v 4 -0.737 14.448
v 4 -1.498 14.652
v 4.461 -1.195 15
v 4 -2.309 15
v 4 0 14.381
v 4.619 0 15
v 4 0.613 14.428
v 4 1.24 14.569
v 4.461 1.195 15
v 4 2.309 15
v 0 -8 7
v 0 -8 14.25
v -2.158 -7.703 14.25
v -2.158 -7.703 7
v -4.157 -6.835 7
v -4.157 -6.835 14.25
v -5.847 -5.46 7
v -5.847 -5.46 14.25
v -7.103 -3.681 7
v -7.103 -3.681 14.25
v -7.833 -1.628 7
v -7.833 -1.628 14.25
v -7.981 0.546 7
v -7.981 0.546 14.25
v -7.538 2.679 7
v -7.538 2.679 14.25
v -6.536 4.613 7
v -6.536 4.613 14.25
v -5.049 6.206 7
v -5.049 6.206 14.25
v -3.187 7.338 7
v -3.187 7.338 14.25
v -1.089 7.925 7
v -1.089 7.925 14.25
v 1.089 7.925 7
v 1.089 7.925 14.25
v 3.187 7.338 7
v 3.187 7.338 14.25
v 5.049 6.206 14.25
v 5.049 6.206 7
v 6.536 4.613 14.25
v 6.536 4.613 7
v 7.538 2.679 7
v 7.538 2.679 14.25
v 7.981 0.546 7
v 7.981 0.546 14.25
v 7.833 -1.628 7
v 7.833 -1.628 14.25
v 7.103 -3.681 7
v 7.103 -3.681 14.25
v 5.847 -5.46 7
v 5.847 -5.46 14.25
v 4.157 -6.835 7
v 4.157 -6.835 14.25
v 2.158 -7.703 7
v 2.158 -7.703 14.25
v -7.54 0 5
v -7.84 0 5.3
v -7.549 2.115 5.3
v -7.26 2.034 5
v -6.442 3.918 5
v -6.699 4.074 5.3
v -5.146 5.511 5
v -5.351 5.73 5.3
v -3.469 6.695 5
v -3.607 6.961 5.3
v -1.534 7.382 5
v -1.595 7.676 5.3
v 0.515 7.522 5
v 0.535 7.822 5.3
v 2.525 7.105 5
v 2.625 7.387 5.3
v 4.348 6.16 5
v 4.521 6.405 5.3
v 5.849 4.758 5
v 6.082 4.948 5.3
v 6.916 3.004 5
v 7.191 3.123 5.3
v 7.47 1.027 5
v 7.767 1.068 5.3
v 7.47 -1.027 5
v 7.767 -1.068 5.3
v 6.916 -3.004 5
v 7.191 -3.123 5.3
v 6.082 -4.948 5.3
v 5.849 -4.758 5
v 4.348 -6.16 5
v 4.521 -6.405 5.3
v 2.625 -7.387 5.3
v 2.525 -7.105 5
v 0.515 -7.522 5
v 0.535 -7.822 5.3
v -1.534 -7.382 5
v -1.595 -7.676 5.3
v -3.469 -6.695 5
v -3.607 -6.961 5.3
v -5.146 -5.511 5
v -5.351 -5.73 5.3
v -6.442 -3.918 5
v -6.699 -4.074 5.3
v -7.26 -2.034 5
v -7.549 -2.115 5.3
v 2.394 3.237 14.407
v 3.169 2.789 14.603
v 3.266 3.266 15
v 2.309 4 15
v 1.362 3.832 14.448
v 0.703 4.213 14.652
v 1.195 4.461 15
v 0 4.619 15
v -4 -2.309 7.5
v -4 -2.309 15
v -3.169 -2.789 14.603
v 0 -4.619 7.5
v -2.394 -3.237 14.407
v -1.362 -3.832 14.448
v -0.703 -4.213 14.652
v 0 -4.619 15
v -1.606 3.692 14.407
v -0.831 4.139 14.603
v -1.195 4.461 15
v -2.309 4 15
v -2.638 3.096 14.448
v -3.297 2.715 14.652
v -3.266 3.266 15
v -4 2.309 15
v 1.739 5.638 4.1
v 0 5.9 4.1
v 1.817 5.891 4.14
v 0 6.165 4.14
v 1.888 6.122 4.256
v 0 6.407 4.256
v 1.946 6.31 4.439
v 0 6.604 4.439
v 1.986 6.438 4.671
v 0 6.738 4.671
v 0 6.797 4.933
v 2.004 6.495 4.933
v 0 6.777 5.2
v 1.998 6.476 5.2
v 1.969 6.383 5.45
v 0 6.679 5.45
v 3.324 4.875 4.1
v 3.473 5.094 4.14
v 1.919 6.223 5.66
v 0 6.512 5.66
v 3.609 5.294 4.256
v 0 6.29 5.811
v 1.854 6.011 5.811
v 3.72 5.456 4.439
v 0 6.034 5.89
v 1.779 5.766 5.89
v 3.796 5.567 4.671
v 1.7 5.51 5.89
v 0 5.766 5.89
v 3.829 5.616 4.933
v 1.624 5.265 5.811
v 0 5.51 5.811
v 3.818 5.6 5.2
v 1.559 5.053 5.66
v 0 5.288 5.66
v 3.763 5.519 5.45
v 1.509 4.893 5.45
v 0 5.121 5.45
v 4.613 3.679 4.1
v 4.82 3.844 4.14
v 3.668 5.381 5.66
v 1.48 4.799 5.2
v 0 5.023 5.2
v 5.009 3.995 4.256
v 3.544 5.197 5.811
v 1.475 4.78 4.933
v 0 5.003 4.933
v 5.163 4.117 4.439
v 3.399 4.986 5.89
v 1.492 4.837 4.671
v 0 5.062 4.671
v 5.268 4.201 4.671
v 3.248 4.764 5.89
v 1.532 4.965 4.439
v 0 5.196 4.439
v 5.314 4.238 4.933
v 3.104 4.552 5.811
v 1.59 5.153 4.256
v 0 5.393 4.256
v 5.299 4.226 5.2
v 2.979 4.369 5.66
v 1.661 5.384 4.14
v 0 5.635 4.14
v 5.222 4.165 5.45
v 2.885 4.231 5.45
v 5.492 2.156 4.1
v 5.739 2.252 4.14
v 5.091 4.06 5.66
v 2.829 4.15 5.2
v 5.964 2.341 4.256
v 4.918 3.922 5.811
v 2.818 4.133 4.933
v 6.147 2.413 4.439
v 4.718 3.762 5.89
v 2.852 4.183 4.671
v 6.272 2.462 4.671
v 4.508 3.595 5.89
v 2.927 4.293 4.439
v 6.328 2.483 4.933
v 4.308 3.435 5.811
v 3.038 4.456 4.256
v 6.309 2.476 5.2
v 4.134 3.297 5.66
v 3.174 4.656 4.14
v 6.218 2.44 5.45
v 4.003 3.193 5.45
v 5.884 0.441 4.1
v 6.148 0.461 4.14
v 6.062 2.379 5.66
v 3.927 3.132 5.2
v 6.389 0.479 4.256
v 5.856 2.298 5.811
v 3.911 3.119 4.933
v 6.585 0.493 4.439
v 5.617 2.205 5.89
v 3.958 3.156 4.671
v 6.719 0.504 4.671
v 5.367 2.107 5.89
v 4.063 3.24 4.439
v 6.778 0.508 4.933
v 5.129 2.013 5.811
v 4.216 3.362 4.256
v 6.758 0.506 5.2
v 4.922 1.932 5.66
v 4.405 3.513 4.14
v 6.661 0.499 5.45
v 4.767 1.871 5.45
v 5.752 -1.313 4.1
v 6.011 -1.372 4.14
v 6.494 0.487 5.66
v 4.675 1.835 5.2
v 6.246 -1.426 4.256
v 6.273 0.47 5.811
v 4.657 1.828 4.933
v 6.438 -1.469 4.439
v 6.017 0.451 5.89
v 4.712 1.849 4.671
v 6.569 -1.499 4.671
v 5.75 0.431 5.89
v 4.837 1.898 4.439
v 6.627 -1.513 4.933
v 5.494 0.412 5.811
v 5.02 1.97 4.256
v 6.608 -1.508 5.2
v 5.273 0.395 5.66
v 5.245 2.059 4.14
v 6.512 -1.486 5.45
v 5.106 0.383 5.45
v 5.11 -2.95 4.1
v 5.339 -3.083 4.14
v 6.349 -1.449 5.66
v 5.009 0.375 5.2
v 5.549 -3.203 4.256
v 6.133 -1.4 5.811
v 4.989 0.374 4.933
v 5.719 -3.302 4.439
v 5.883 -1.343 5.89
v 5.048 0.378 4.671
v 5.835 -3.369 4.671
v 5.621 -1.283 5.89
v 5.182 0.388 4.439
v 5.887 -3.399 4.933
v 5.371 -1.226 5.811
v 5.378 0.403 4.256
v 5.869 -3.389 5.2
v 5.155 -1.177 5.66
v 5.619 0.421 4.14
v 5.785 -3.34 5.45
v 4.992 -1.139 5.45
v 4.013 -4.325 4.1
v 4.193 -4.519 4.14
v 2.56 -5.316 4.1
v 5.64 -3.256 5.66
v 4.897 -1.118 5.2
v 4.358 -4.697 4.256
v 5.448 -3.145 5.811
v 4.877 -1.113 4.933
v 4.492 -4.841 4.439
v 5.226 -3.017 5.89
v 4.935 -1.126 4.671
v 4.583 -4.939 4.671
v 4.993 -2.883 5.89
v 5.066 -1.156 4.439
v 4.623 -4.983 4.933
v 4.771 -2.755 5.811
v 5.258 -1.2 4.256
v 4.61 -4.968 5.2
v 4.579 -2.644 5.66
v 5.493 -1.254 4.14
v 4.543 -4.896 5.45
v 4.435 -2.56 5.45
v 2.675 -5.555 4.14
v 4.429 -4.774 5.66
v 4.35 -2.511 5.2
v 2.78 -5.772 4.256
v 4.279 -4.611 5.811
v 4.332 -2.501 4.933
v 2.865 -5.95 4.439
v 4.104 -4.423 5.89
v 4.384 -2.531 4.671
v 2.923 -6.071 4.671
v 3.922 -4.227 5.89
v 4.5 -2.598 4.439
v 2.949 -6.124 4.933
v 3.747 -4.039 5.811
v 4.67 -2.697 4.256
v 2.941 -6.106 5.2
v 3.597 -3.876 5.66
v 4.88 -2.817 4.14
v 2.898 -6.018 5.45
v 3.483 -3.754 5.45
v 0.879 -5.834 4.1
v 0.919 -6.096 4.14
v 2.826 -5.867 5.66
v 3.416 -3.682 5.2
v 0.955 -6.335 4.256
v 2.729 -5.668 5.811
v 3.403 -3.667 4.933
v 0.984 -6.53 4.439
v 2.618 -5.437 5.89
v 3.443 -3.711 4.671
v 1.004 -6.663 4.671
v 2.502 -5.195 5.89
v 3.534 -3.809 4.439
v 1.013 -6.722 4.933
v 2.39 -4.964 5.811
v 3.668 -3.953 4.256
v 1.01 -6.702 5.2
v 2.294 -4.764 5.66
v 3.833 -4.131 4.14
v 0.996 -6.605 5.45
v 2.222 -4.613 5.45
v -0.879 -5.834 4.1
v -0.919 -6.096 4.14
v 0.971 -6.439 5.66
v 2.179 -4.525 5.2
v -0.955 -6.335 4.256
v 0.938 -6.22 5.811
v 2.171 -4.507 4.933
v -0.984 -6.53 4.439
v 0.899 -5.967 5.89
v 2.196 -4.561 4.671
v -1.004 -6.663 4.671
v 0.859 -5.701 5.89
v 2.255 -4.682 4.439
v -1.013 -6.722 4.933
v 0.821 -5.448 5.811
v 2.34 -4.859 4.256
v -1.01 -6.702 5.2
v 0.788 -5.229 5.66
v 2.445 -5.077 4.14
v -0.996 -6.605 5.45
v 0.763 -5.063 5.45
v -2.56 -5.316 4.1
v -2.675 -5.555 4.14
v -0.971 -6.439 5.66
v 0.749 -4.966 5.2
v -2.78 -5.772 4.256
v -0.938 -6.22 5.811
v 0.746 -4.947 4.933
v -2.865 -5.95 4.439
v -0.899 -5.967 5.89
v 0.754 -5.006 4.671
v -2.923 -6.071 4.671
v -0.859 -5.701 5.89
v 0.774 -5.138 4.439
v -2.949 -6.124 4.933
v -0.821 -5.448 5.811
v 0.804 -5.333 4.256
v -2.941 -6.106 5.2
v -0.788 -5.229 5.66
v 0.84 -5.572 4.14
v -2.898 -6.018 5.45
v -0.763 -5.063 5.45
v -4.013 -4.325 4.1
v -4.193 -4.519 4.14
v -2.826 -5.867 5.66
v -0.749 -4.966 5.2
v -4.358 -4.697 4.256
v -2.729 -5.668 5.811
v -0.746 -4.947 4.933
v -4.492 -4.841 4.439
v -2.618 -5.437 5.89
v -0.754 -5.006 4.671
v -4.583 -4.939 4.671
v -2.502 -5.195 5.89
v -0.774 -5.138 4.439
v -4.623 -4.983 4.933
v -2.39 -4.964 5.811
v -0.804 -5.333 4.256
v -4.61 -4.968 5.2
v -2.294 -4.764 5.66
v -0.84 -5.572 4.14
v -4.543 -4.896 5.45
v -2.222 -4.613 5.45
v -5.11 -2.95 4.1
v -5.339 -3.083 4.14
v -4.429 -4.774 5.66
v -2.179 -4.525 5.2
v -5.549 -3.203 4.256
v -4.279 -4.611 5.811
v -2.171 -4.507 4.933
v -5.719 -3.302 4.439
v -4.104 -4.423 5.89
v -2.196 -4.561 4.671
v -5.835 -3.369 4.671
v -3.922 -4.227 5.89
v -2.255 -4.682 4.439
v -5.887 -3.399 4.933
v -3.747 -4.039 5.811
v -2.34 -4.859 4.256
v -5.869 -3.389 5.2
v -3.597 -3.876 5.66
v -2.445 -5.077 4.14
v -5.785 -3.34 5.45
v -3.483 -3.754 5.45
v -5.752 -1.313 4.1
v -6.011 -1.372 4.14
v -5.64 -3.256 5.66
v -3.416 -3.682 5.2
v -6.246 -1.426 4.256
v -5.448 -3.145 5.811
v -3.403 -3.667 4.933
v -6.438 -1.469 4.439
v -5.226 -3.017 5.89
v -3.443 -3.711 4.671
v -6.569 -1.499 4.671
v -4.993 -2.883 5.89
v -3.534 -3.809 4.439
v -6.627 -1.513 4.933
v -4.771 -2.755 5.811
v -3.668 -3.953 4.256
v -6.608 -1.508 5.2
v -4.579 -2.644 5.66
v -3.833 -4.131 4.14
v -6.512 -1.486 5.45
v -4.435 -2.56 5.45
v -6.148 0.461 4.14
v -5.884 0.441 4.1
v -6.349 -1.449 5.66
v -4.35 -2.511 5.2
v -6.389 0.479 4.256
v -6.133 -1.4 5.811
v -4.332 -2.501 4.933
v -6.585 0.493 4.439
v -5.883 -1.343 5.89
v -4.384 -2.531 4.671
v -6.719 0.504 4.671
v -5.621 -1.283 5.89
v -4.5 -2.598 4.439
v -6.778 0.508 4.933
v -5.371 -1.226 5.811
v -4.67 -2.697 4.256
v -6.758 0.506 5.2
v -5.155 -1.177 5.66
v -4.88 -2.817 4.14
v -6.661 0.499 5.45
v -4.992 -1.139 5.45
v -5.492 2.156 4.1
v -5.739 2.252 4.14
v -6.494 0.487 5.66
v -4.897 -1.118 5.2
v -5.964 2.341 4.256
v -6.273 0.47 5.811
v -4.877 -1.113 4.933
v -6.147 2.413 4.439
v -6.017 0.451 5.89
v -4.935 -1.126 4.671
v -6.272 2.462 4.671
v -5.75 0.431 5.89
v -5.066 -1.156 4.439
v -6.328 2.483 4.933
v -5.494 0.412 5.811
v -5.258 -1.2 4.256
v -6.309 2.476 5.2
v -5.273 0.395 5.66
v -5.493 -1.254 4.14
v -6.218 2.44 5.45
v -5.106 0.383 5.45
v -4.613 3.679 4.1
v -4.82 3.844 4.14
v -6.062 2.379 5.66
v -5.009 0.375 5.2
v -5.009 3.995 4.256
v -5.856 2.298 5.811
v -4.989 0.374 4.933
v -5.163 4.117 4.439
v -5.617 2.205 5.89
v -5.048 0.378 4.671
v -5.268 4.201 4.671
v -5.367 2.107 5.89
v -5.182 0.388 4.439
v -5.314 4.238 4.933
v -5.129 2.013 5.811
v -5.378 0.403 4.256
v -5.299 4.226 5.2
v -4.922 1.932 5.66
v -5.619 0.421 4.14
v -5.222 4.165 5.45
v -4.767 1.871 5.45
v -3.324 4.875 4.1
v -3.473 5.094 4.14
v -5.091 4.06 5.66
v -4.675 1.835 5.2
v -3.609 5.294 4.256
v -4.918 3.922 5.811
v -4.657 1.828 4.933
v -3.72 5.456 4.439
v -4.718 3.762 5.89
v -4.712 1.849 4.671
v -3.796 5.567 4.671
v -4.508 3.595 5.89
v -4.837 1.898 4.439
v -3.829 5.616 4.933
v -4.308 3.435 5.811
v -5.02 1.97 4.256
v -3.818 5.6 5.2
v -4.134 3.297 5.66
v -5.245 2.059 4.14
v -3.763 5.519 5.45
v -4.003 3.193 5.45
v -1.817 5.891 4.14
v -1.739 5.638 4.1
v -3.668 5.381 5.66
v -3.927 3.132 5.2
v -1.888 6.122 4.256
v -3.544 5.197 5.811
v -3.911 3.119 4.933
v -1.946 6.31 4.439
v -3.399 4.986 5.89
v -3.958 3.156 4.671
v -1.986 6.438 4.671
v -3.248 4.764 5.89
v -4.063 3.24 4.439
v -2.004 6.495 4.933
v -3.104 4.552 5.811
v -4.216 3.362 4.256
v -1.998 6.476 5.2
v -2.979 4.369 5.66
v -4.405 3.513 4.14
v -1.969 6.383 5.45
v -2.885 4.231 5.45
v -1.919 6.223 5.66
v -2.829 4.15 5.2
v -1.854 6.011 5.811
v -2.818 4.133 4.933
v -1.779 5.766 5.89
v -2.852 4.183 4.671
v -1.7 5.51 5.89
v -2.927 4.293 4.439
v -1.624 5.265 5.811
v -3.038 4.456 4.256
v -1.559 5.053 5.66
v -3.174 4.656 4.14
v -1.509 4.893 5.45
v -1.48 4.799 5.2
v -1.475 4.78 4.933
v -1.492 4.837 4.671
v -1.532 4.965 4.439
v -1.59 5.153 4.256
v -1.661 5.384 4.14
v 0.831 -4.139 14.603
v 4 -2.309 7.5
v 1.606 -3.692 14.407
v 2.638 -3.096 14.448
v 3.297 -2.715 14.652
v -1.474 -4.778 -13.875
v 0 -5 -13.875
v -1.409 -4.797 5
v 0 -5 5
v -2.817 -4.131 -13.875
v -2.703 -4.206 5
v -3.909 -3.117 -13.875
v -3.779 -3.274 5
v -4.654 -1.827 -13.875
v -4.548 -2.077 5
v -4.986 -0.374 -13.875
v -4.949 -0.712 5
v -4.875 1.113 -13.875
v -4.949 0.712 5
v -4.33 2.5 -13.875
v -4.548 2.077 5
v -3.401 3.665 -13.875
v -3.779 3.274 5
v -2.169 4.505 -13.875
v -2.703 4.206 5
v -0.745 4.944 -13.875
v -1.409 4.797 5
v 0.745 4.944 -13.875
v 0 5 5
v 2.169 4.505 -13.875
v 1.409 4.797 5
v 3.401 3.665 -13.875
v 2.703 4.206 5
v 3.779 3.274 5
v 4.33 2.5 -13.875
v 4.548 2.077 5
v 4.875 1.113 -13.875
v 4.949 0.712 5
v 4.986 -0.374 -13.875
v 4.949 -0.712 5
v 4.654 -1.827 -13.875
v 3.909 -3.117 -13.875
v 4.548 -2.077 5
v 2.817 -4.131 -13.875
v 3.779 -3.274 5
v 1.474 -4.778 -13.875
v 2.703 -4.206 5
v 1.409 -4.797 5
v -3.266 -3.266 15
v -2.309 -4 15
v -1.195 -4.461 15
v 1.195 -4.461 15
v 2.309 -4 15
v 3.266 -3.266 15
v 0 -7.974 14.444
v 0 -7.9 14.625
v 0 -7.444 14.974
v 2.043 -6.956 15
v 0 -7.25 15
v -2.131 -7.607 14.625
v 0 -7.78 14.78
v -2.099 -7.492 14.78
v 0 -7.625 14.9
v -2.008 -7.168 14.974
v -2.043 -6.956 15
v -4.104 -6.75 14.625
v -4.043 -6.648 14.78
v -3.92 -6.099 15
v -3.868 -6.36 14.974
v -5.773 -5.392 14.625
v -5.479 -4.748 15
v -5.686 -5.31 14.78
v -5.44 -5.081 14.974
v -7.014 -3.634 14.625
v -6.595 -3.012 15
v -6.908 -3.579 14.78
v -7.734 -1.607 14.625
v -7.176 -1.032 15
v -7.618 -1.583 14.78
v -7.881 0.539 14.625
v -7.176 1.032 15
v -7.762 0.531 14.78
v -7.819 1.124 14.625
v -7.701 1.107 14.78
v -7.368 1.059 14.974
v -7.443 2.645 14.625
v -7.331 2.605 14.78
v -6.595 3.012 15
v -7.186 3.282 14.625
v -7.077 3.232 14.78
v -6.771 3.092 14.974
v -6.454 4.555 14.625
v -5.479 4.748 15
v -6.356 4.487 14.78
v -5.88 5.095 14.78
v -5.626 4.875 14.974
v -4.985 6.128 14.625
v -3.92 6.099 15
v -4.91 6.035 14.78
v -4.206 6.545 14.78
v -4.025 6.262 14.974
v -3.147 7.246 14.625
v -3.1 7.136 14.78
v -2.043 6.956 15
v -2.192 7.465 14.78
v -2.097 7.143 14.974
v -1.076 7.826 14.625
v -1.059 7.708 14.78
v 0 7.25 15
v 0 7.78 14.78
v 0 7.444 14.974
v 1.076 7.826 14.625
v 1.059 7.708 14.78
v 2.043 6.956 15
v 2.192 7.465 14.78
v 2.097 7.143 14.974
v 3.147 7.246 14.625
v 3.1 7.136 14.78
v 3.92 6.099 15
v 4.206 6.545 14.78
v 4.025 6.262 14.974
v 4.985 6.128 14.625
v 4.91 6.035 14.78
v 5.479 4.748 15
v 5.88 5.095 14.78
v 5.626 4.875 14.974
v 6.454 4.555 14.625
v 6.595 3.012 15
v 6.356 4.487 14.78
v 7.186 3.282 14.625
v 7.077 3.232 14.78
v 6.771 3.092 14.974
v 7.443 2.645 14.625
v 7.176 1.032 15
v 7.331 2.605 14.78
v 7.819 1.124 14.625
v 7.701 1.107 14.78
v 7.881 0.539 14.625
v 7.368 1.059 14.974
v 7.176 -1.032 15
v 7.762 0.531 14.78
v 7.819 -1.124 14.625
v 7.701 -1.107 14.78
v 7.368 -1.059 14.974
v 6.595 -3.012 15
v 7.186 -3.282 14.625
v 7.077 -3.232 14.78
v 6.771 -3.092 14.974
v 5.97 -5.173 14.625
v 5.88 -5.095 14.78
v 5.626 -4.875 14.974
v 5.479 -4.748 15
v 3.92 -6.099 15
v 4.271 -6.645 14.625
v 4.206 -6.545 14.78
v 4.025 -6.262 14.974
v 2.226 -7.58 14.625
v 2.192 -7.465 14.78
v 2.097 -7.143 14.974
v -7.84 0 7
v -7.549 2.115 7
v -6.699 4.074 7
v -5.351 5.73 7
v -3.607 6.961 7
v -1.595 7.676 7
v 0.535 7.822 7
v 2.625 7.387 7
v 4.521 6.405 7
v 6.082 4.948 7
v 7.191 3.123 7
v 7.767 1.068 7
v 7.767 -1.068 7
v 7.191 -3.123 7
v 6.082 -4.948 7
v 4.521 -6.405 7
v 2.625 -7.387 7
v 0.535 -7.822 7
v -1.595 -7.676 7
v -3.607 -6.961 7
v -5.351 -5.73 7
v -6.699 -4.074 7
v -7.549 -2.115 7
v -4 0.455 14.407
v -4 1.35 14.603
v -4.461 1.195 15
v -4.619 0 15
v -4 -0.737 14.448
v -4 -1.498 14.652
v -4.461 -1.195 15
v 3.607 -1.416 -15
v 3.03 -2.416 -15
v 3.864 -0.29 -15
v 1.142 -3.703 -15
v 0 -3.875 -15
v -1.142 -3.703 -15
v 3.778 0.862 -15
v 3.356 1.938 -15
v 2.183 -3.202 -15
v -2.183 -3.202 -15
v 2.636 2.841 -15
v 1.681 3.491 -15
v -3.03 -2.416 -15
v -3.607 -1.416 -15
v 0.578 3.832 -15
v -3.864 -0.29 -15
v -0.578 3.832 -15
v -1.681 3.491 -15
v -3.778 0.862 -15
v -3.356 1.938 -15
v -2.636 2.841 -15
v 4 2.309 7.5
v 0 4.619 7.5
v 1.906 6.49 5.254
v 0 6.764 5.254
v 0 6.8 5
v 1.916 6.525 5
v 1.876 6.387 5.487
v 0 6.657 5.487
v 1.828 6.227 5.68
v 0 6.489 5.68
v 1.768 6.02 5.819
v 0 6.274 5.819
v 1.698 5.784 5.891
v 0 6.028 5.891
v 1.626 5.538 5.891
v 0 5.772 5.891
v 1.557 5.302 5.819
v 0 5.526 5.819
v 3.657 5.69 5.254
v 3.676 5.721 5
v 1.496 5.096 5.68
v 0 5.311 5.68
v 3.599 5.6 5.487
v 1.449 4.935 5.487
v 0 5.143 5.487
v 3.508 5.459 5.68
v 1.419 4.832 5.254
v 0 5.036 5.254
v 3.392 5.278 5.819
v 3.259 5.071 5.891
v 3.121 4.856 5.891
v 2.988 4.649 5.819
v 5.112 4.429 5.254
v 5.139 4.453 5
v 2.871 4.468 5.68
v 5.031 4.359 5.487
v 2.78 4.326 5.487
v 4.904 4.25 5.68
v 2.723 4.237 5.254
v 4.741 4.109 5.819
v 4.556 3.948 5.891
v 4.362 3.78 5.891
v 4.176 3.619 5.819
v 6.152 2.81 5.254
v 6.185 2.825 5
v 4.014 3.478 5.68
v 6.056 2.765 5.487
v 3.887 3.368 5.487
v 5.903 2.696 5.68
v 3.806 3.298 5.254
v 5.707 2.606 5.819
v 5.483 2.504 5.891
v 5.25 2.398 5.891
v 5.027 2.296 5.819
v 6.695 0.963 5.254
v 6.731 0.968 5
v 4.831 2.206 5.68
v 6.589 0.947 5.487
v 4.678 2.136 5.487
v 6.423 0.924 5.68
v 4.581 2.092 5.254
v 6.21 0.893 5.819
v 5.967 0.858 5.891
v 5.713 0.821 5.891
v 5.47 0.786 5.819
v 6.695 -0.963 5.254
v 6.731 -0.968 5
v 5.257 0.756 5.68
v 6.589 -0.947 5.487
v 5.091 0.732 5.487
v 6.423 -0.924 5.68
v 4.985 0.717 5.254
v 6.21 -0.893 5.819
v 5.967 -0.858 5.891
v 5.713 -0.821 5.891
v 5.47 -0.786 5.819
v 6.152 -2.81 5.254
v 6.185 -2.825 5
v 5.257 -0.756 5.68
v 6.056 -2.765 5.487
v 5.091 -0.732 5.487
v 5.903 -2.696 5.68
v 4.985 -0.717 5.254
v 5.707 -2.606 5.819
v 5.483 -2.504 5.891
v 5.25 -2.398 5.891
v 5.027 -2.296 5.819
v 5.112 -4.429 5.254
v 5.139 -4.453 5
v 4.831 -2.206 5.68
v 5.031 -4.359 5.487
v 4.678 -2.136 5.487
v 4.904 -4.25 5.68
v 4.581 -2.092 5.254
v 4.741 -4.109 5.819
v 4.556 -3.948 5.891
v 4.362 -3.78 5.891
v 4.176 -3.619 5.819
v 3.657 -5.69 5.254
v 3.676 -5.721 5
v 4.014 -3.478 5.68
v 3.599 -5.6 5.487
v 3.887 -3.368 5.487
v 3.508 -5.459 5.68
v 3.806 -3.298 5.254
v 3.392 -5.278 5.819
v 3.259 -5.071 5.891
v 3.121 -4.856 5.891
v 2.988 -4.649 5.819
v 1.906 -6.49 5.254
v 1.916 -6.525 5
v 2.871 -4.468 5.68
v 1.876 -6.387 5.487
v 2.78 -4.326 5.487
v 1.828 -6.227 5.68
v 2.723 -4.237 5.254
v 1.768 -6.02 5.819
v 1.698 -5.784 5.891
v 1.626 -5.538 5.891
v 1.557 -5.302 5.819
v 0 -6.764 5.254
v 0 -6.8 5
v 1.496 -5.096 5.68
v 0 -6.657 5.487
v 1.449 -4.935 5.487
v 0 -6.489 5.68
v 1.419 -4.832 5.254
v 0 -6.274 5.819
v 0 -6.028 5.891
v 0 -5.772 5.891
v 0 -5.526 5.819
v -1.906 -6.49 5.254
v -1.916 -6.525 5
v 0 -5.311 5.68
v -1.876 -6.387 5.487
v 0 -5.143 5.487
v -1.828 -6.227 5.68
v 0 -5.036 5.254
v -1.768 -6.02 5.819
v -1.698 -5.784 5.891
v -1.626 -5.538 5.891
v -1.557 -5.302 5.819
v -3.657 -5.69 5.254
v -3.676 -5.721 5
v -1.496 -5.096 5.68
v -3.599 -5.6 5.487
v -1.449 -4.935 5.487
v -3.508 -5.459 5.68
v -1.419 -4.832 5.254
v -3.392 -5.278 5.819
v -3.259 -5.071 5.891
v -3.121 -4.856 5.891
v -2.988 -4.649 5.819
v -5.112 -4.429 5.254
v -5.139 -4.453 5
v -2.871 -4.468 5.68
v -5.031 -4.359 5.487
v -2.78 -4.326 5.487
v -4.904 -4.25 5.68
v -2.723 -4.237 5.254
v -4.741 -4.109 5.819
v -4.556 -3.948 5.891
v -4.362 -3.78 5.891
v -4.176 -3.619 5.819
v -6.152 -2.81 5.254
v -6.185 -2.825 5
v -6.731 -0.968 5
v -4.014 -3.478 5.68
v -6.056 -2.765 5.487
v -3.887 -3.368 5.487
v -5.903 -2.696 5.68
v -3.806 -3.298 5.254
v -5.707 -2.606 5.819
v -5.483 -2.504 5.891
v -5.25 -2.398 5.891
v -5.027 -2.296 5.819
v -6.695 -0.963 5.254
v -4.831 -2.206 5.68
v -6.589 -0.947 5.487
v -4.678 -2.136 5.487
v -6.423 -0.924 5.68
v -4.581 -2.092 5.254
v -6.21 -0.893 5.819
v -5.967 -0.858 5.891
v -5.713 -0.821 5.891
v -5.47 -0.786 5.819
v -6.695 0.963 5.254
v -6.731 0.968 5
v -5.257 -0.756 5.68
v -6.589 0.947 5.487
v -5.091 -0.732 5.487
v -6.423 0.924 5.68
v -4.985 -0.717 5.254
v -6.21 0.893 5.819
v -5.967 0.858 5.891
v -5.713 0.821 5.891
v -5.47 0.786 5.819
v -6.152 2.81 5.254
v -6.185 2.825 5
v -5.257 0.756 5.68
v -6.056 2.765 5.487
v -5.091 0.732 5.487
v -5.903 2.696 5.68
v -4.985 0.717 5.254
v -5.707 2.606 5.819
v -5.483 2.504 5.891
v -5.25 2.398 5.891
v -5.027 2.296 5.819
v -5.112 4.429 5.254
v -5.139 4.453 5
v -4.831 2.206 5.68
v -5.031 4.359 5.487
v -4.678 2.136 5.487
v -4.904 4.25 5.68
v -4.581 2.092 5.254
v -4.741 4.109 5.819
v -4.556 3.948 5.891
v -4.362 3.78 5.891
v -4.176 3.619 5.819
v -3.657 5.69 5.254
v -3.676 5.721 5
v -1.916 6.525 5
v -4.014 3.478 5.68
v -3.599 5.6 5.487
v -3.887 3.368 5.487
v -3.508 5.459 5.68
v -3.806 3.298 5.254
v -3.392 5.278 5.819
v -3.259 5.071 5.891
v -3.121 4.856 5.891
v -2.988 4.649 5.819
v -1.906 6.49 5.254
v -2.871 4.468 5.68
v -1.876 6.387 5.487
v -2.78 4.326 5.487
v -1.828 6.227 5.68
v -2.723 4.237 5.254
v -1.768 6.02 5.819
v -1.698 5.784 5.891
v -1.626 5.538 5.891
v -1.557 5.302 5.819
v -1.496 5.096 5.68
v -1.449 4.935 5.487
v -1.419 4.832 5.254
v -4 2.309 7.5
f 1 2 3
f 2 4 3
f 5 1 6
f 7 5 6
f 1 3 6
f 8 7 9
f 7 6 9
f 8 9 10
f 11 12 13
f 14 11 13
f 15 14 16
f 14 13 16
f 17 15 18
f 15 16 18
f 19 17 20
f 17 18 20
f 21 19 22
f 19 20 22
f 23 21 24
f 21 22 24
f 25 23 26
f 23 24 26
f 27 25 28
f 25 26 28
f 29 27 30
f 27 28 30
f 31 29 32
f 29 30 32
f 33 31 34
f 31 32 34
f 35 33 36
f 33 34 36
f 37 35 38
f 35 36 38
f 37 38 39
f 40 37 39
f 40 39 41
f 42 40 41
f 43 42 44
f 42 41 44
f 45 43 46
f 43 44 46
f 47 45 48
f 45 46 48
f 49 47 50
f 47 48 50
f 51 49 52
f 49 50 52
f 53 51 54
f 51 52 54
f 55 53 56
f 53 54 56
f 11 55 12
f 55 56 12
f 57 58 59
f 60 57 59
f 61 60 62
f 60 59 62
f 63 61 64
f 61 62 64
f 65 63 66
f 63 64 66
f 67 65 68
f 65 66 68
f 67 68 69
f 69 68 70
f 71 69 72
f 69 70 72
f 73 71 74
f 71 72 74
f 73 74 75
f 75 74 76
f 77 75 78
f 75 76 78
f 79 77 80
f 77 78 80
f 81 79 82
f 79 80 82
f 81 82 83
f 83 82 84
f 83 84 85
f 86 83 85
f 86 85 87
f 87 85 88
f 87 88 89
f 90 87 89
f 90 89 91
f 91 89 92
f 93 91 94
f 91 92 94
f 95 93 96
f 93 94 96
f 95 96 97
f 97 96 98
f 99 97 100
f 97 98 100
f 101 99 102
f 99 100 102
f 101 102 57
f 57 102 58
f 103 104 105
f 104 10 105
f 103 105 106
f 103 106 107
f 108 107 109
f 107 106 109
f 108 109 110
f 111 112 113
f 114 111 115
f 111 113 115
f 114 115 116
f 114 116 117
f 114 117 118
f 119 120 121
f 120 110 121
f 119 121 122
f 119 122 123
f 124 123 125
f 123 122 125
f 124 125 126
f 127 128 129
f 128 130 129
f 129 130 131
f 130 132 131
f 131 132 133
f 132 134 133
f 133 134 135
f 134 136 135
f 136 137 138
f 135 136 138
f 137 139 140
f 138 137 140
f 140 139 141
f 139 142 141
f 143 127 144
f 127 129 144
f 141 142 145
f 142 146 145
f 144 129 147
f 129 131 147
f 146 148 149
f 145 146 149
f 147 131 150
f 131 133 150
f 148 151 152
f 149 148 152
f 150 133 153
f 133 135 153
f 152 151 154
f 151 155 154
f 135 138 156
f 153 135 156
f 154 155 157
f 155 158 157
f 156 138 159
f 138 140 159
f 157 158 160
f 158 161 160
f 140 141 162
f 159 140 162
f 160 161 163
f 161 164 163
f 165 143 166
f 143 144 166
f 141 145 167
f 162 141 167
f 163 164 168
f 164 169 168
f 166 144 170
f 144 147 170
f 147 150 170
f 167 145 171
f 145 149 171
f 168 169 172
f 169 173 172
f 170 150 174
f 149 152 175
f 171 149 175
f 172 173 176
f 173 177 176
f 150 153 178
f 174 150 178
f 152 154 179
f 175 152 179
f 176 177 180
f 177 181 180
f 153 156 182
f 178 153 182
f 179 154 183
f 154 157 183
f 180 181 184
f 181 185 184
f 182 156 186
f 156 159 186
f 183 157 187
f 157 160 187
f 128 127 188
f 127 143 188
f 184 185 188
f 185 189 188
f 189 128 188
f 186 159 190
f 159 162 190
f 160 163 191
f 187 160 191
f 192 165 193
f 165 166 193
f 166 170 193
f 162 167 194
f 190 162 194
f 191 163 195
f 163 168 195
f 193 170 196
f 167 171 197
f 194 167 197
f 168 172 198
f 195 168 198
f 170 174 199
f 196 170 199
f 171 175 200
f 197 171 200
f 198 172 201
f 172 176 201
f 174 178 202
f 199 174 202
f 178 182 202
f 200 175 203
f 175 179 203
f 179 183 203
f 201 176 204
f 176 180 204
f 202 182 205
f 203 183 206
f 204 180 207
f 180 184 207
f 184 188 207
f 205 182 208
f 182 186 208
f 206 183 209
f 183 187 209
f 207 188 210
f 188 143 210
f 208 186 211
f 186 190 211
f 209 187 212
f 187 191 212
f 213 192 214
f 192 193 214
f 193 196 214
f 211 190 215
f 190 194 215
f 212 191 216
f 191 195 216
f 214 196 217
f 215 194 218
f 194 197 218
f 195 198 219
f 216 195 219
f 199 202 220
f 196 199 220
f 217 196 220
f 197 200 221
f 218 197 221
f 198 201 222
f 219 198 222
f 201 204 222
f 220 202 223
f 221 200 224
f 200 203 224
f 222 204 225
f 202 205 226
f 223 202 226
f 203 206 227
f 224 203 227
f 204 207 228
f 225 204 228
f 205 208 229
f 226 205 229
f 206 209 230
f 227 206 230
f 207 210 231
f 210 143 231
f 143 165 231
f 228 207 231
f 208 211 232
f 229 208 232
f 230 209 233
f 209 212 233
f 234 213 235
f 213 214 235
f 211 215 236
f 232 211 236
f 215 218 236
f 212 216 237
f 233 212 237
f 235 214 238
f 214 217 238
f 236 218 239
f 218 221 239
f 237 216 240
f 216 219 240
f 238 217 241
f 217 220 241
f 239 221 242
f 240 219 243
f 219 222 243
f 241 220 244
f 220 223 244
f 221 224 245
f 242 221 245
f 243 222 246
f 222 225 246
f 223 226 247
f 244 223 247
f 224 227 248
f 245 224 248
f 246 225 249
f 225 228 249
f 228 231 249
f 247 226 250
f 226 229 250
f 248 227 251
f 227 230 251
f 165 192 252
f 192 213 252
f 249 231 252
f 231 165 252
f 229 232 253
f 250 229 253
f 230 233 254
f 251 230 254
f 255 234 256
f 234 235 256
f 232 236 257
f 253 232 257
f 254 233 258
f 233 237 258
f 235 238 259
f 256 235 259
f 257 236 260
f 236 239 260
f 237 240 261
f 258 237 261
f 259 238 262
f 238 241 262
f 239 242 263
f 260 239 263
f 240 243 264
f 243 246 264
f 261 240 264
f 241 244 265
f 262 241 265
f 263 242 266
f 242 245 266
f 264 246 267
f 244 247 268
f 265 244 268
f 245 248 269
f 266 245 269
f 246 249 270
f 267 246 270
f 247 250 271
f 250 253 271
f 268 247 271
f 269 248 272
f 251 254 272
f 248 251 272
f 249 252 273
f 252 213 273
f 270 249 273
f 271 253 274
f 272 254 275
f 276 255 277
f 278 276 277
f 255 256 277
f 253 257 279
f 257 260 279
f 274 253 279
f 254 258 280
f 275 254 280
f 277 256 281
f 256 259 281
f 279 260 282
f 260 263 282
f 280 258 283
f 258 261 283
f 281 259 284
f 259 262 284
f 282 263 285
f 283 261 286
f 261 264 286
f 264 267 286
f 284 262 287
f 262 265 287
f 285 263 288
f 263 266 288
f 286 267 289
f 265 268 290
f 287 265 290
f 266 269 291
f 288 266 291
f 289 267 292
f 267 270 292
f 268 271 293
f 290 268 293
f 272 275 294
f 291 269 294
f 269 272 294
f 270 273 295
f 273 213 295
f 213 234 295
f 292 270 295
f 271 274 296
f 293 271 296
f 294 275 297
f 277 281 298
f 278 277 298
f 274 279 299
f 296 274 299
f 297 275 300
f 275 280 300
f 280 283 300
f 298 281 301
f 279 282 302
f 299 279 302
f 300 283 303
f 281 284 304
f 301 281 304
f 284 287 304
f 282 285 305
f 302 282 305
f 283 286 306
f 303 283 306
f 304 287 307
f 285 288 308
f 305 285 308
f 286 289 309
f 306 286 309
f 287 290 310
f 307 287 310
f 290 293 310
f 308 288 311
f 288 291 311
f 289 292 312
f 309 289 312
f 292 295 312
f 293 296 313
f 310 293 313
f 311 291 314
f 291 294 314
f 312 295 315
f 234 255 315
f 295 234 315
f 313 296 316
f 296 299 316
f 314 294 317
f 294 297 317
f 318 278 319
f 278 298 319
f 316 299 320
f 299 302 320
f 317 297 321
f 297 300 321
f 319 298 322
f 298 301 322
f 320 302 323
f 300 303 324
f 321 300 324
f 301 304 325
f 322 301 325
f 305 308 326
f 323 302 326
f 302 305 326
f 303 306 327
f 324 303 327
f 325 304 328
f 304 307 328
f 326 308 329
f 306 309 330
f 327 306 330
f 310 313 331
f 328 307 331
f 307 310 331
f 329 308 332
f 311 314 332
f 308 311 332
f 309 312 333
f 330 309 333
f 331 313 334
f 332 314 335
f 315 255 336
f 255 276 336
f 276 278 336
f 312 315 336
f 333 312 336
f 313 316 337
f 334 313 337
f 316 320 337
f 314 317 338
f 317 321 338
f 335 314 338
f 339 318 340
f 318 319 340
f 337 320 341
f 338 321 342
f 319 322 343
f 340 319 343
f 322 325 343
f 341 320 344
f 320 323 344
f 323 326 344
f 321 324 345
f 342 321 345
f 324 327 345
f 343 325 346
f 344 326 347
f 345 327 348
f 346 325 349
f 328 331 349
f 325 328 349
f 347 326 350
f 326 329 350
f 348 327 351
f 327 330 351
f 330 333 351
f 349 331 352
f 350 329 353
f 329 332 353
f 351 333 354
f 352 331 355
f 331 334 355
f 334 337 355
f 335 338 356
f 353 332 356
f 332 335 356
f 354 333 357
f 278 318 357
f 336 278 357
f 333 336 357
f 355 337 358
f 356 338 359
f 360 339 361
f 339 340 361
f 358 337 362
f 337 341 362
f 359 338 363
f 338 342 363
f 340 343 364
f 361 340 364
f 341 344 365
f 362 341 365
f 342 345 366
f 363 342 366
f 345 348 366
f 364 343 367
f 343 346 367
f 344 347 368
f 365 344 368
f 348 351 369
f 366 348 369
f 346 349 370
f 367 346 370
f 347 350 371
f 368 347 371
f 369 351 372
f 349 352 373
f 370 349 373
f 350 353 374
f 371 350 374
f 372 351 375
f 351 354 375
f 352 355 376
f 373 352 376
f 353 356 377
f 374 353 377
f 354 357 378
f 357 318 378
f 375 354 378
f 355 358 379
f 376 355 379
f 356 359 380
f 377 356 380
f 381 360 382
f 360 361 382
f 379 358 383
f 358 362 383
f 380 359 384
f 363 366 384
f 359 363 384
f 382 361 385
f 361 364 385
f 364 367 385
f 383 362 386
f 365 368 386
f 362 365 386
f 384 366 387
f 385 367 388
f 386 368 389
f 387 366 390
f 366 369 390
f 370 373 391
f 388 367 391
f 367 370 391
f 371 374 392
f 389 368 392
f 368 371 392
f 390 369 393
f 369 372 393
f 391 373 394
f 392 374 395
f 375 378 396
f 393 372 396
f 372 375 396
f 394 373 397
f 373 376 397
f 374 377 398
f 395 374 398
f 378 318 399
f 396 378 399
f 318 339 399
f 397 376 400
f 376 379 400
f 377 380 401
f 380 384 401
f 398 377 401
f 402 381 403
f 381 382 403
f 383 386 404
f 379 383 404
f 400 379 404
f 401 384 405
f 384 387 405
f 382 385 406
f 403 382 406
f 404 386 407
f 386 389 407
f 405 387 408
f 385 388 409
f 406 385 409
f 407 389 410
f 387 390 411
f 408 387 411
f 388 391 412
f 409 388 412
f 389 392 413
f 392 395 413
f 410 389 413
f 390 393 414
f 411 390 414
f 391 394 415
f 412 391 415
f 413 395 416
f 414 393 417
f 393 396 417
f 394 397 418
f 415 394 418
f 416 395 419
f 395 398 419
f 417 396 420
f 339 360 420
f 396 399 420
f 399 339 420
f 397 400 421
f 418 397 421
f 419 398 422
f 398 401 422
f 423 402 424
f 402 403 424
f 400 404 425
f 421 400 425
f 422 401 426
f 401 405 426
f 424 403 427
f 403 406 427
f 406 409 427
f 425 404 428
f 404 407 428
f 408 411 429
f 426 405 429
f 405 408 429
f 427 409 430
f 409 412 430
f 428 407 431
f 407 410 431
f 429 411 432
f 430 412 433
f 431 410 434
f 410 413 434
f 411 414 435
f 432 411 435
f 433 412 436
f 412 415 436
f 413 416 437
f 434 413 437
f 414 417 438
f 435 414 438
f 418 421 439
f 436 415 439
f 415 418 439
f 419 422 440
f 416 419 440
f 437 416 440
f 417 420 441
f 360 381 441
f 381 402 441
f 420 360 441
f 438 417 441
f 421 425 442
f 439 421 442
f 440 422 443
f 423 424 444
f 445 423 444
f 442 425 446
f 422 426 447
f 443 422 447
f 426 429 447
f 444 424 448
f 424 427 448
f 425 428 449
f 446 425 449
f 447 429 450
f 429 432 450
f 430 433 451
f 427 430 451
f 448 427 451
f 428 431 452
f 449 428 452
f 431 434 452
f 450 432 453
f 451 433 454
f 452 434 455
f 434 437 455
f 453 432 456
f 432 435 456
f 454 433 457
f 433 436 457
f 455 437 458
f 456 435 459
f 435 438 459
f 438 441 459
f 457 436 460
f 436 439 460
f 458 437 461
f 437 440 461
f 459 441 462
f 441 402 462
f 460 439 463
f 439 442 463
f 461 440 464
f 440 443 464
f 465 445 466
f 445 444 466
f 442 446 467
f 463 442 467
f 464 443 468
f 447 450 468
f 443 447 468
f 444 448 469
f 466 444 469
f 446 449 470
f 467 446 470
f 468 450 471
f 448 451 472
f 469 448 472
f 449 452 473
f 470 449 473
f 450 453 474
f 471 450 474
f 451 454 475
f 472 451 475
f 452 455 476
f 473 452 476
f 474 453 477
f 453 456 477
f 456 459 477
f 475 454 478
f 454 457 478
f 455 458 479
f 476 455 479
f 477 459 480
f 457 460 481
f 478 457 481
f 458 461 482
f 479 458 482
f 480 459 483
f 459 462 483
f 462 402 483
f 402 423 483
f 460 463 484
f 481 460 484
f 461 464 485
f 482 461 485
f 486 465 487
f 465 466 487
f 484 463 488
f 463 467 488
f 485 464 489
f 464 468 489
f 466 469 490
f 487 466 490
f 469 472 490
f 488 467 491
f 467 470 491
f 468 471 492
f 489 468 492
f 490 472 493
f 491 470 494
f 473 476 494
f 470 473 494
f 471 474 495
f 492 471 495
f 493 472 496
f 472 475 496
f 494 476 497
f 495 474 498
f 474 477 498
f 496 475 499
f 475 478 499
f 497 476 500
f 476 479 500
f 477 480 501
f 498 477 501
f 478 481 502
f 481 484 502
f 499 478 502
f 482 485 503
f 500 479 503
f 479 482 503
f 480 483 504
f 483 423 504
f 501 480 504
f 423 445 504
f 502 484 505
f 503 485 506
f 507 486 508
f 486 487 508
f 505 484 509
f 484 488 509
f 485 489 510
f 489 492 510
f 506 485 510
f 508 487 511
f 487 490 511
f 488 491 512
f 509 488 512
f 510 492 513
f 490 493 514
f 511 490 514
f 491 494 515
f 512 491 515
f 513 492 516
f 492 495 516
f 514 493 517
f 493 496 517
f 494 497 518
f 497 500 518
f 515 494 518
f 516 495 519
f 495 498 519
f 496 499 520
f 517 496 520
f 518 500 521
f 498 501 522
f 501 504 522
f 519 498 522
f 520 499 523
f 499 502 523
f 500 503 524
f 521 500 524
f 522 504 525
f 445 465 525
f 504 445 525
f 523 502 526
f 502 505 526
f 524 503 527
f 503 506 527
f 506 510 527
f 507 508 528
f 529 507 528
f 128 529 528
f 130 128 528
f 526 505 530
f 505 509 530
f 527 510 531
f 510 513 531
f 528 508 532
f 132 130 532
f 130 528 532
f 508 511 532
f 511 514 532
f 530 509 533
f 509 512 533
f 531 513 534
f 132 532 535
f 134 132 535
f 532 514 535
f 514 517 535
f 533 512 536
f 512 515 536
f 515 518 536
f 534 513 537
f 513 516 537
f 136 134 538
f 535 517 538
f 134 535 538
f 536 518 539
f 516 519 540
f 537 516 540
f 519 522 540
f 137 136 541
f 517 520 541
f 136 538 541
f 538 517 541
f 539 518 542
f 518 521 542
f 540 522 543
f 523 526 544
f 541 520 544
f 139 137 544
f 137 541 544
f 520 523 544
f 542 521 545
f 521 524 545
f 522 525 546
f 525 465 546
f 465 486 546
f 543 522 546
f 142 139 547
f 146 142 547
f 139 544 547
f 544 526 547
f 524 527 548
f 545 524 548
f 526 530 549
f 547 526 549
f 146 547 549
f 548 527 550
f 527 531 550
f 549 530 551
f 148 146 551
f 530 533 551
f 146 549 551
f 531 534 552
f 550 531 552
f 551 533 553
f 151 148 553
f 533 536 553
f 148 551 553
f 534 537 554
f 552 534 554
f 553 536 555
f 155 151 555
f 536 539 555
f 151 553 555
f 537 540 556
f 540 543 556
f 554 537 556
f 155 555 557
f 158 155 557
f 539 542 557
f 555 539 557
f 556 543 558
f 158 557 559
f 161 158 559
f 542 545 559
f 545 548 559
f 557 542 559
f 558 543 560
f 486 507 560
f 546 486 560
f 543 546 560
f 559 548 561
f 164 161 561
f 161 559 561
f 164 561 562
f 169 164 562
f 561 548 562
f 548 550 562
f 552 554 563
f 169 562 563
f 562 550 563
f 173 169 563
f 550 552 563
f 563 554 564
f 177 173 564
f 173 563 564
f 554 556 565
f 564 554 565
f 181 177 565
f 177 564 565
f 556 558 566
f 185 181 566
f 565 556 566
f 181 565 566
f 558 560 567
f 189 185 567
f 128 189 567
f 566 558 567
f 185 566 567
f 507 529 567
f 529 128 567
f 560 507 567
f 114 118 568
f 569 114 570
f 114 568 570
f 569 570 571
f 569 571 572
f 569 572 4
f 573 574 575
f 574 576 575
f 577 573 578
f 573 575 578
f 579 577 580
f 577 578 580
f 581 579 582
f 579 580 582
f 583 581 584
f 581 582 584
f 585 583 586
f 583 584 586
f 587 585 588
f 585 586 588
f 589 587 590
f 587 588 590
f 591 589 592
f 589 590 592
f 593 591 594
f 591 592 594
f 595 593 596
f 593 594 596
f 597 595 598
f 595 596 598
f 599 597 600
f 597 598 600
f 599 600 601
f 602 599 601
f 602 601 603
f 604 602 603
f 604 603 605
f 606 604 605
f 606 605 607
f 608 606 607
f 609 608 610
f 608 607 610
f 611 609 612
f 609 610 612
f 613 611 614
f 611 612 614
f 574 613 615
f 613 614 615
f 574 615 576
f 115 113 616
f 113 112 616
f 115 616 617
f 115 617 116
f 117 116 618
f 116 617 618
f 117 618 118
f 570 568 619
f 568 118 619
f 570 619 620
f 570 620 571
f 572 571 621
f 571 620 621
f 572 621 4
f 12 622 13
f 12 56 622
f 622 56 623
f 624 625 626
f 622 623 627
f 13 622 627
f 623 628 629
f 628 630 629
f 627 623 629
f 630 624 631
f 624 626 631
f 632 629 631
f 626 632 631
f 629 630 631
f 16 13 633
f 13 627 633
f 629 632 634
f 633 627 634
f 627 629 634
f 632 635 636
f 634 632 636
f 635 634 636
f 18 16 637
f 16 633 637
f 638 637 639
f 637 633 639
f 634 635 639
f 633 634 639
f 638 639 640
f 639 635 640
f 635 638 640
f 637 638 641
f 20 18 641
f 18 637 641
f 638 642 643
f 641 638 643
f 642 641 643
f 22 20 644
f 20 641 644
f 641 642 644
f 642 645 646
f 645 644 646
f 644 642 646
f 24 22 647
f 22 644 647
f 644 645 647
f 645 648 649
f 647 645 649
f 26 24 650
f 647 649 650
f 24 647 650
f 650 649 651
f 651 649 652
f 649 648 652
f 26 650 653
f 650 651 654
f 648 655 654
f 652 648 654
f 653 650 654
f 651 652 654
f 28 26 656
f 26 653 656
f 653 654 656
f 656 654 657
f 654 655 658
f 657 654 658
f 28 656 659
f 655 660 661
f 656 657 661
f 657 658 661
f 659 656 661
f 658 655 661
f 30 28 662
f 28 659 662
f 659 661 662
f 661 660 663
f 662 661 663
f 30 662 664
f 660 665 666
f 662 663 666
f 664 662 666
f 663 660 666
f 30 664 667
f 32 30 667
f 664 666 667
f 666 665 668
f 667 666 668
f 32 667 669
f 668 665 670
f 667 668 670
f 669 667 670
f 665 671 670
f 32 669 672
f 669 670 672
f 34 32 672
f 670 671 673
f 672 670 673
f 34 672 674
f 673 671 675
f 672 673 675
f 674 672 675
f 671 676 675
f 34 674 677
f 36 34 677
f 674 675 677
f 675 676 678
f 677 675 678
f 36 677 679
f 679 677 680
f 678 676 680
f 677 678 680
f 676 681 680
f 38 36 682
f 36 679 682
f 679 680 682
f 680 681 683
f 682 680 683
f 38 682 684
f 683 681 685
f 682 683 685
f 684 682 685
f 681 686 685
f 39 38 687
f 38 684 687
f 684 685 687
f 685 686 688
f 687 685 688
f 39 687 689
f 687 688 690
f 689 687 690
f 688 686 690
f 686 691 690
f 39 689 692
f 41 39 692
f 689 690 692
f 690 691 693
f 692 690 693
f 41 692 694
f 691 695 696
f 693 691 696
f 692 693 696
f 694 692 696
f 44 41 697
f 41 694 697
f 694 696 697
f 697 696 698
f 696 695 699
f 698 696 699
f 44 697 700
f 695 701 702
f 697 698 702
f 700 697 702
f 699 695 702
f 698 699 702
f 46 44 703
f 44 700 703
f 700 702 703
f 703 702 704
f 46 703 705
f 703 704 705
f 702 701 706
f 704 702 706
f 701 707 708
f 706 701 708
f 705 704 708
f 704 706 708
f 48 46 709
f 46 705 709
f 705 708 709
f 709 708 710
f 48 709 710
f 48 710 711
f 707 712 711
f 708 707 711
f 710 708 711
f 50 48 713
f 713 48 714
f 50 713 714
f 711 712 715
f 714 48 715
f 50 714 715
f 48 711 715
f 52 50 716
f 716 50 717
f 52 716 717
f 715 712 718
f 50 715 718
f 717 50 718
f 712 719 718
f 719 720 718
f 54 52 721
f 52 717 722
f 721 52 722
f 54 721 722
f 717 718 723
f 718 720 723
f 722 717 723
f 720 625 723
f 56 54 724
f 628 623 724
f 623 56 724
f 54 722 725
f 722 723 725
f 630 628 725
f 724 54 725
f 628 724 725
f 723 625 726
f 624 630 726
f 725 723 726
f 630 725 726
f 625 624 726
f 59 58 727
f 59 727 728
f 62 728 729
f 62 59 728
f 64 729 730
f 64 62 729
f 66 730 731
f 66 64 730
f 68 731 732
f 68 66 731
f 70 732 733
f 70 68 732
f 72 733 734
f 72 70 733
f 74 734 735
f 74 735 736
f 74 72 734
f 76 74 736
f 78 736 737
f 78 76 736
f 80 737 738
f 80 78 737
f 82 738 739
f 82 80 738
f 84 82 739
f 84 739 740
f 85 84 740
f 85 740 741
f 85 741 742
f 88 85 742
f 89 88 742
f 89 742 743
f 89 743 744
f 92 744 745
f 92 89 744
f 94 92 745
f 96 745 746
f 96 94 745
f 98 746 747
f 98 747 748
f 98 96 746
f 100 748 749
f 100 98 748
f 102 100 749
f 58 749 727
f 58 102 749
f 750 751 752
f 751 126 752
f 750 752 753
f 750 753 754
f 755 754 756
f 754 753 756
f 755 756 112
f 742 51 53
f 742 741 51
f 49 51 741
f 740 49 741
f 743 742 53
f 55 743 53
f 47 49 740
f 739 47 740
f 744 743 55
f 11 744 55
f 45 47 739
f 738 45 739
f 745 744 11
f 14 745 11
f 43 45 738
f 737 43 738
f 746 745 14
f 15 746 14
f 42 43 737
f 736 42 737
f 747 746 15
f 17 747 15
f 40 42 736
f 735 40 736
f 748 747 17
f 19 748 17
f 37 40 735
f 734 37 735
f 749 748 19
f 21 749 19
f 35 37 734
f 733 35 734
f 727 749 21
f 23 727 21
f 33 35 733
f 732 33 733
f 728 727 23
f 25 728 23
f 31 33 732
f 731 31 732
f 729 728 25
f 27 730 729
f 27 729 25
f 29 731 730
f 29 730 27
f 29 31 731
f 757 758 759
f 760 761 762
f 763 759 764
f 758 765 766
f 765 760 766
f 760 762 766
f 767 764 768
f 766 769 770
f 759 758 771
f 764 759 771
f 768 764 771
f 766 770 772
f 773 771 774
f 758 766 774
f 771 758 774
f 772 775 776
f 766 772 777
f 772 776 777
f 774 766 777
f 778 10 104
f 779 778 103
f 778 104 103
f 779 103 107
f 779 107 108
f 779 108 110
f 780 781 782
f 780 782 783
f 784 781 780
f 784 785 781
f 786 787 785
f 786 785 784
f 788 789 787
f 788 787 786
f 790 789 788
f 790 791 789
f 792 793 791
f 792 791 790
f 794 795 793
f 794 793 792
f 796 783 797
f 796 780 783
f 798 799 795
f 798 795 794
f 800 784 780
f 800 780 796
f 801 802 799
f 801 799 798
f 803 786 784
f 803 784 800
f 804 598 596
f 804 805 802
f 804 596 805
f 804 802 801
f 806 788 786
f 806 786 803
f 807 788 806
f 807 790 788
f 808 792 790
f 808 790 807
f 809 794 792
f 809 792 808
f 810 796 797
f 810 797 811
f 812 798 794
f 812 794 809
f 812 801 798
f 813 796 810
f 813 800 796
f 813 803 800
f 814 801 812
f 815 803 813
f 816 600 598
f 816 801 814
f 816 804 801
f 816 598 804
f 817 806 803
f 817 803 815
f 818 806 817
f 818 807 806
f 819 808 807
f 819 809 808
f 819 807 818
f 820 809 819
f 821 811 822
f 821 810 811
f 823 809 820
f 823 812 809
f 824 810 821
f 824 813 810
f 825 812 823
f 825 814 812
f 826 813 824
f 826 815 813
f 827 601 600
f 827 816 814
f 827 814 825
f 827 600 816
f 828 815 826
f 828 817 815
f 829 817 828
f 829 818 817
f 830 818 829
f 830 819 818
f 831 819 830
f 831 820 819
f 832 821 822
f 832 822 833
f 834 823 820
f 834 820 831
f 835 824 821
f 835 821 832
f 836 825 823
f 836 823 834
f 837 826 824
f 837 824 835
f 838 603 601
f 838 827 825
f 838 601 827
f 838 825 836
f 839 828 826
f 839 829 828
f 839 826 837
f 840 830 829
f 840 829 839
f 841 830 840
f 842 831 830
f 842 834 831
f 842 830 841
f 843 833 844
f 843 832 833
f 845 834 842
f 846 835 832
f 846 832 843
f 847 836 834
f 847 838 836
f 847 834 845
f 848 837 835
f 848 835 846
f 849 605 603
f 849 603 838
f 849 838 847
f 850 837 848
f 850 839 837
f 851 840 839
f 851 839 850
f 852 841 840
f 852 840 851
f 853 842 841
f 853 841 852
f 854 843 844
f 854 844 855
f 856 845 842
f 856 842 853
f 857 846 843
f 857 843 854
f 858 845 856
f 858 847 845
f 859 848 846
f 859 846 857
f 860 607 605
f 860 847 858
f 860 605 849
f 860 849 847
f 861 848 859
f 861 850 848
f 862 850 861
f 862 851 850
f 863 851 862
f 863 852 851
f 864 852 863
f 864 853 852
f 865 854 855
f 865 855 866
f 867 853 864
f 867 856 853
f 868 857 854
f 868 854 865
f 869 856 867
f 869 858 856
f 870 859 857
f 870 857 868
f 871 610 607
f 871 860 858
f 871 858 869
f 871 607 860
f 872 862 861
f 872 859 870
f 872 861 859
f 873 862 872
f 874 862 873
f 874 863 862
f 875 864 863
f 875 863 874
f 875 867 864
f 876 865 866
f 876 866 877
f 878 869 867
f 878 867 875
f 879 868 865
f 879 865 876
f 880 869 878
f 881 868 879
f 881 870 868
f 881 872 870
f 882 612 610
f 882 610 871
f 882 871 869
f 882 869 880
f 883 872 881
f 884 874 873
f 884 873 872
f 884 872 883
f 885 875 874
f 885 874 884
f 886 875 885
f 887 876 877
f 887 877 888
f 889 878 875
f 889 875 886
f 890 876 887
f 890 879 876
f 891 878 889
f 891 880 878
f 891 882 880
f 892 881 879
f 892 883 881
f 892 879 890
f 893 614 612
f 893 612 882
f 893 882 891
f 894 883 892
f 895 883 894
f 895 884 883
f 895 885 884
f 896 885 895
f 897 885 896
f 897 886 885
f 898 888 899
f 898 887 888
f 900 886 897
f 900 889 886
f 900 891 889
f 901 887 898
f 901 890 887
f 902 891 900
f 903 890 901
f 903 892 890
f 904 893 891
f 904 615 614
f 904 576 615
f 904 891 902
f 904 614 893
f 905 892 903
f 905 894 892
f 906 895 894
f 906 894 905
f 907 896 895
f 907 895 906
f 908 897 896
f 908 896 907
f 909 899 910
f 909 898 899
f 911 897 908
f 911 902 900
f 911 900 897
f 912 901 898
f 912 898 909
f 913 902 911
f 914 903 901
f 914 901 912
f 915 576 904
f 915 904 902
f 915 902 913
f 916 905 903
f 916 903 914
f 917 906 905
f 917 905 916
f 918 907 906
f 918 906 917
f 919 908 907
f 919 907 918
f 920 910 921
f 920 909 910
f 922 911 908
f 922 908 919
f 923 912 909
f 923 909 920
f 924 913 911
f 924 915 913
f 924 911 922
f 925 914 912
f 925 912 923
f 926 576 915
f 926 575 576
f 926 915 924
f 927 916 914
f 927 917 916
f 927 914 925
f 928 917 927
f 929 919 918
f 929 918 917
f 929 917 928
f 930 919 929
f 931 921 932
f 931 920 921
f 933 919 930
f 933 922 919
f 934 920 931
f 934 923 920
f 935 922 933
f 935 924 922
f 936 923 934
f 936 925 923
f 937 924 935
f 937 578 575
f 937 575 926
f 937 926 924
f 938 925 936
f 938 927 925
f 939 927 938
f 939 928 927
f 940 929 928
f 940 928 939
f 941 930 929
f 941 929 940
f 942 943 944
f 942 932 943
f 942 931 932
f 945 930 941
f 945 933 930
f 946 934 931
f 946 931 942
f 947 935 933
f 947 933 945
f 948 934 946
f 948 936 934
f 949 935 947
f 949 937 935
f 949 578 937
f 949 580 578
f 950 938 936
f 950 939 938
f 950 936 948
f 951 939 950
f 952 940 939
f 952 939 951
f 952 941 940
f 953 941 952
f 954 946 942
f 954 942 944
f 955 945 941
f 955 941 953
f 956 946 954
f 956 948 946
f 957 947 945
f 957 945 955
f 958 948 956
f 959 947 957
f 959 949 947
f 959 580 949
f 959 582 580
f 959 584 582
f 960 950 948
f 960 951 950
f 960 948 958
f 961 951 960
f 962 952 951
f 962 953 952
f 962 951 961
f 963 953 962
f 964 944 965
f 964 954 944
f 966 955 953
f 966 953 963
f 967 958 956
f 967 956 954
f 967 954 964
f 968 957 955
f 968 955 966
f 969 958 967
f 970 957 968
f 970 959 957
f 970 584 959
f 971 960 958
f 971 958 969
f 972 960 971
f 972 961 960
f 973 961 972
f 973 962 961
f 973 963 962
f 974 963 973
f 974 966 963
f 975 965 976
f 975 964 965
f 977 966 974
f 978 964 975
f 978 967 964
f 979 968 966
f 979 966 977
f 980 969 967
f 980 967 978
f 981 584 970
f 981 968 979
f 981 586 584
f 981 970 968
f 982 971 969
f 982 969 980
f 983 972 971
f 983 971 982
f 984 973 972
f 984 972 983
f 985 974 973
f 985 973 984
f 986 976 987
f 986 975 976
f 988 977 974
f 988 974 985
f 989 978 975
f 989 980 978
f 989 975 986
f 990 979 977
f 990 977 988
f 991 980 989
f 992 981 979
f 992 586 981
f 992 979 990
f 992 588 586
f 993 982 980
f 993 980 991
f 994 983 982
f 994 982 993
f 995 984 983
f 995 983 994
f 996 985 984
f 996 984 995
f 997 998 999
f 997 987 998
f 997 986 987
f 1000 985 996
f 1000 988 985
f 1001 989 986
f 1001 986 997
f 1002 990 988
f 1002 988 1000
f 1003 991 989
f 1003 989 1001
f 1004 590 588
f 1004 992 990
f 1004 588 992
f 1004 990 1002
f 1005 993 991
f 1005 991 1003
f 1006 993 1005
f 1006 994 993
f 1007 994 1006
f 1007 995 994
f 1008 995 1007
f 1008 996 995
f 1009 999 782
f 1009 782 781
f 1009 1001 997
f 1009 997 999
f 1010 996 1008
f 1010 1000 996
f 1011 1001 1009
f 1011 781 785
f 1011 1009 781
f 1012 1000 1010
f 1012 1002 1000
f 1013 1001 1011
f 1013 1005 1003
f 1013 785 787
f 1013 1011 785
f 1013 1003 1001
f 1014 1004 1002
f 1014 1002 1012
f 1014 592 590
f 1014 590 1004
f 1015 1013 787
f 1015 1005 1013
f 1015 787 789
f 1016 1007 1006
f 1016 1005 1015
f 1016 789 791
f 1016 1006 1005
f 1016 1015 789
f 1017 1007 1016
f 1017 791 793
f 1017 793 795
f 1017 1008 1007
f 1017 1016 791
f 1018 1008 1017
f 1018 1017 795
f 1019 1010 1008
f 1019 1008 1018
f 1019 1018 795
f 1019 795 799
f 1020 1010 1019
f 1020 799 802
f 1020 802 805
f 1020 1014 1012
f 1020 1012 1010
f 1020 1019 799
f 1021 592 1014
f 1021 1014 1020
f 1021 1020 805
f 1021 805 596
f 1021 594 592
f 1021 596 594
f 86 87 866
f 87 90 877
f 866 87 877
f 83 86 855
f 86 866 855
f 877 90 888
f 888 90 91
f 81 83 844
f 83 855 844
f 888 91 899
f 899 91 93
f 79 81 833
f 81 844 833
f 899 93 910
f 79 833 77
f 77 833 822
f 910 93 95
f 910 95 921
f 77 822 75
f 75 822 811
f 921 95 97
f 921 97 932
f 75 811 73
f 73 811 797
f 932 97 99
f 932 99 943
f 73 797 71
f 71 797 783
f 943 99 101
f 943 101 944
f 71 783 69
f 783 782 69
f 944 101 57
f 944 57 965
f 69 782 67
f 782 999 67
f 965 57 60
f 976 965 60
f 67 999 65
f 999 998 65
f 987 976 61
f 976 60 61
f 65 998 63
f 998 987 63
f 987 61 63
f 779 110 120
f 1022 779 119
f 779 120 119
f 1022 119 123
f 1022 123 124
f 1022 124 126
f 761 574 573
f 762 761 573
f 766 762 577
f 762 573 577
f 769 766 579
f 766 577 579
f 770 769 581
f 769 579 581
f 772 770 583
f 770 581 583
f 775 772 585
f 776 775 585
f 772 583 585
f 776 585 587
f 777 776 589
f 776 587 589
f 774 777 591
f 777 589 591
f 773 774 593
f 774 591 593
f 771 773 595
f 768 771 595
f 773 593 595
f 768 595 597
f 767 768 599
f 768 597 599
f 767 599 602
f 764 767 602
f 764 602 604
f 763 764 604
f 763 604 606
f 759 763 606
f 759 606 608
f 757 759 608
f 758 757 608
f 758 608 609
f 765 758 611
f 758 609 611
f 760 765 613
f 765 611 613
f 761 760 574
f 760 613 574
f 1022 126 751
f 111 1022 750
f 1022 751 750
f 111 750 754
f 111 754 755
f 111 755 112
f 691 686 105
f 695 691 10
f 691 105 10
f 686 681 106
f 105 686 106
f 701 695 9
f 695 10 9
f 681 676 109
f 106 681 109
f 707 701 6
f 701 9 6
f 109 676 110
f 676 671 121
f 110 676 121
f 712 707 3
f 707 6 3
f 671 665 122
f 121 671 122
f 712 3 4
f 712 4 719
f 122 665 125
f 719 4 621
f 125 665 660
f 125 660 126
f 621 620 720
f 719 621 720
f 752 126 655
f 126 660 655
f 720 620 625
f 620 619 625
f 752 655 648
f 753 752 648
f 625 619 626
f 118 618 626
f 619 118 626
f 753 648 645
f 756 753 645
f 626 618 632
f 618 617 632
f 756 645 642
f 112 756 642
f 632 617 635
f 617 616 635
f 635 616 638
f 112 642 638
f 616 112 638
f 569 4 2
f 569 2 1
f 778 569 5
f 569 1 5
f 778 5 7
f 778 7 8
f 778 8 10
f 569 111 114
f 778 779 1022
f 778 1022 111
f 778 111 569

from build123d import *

# Parameters (mm, degrees)
CHAMFER1_SIZE      = 1.125
SKETCH3_OUTSIDE_W  = 25.516
SKETCH3_OUTSIDE_H  = 25.516
SKETCH3_OUTSIDE_R  = 7.84
CUT_EXTRUDE1_DEPTH = 2
CHAMFER2_SIZE      = 0.3
FILLET1_R          = 0.75
SKETCH4_R          = 0.9
SKETCH14_R         = 0.9
CUT_EXTRUDE2_DEPTH = 7.5
SKETCH6_R          = 4.618802154
CUT_EXTRUDE3_DEPTH = 2.54
CUT_EXTRUDE3_DRAFT = -45


with BuildPart() as part:
    # Sketch2 → Revolve1 (revolve)
    with BuildSketch(Plane(origin=(0, 0, 0), x_dir=(0, 0, -1), z_dir=(1, 0, 0)), mode=Mode.PRIVATE) as revolve1_sk:
        Polygon((-15, 8), (-15, 0), (15, 0), (15, 5), (-5, 5), (-5, 8), align=None)
    revolve(revolve1_sk.sketch.rotate(Axis((0, 0, 15), (0, 0, -1)), 180), axis=Axis((0, 0, 15), (0, 0, -1)))

    # Chamfer1
    chamfer1_edges = [part.edges().sort_by_distance(p)[0] for p in [
        (0, 5, -15),
    ]]
    chamfer(chamfer1_edges, length=CHAMFER1_SIZE)

    # Sketch3 outside → Cut-Extrude1 (cut)
    with BuildSketch(Plane(origin=(0, 0, 5), x_dir=(-1, 0, 0), z_dir=(0, 0, -1))):
        Rectangle(SKETCH3_OUTSIDE_W, SKETCH3_OUTSIDE_H)
        Circle(SKETCH3_OUTSIDE_R, mode=Mode.SUBTRACT)
    extrude(amount=-CUT_EXTRUDE1_DEPTH, mode=Mode.SUBTRACT)

    # Chamfer2
    chamfer2_edges = [part.edges().sort_by_distance(p)[0] for p in [
        (7.84, 0, 5),
    ]]
    chamfer(chamfer2_edges, length=CHAMFER2_SIZE)

    # Fillet1
    fillet1_edges = [part.edges().sort_by_distance(p)[0] for p in [
        (0, 8, 15),
    ]]
    fillet(fillet1_edges, radius=FILLET1_R)

    # Sketch14 → Cut-Revolve1 (revolve, cut)
    with BuildSketch(Plane(origin=(0, 0, 0), x_dir=(0, 0, -1), z_dir=(1, 0, 0))):
        with Locations((-5, 5.9)):
            Circle(SKETCH14_R)
    revolve(axis=Axis((0, 0, 15), (0, 0, -1)), mode=Mode.SUBTRACT)

    # Sketch5 → Cut-Extrude2 (cut)
    with BuildSketch(Plane.XY.offset(15)):
        Polygon((0, 4.618802154), (-4, 2.309401077), (-4, -2.309401077), (0, -4.618802154), (4, -2.309401077), (4, 2.309401077), align=None)
    extrude(amount=-CUT_EXTRUDE2_DEPTH, mode=Mode.SUBTRACT)


with BuildPart() as body_2:
    # Sketch4 → Revolve2 (revolve)
    with BuildSketch(Plane(origin=(0, 0, 0), x_dir=(0, 0, -1), z_dir=(1, 0, 0))):
        with Locations((-5, 5.9)):
            Circle(SKETCH4_R)
    revolve(axis=Axis((0, 0, 15), (0, 0, -1)))


with BuildPart() as cut_extrude3_tool:
    # Sketch6 → Cut-Extrude3 (with draft: the straight prism first)
    with BuildSketch(Plane.XY.offset(15)):
        Circle(SKETCH6_R)
    extrude(amount=-CUT_EXTRUDE3_DEPTH)
    # Cut-Extrude3: the draft: its side faces are tilted about the plane it starts from
    cut_extrude3_sides = [cut_extrude3_tool.faces().sort_by_distance(p)[0] for p in [
        (-4.618802154, 0, 13.73),
    ]]
    draft(cut_extrude3_sides, Plane.XY.offset(15), CUT_EXTRUDE3_DRAFT)


with BuildPart() as part_1:
    add(part.part)

    # Cut-Extrude3: cut by cut_extrude3_tool
    add(cut_extrude3_tool.part, mode=Mode.SUBTRACT)


solid = Compound([body_2.part, part_1.part])
